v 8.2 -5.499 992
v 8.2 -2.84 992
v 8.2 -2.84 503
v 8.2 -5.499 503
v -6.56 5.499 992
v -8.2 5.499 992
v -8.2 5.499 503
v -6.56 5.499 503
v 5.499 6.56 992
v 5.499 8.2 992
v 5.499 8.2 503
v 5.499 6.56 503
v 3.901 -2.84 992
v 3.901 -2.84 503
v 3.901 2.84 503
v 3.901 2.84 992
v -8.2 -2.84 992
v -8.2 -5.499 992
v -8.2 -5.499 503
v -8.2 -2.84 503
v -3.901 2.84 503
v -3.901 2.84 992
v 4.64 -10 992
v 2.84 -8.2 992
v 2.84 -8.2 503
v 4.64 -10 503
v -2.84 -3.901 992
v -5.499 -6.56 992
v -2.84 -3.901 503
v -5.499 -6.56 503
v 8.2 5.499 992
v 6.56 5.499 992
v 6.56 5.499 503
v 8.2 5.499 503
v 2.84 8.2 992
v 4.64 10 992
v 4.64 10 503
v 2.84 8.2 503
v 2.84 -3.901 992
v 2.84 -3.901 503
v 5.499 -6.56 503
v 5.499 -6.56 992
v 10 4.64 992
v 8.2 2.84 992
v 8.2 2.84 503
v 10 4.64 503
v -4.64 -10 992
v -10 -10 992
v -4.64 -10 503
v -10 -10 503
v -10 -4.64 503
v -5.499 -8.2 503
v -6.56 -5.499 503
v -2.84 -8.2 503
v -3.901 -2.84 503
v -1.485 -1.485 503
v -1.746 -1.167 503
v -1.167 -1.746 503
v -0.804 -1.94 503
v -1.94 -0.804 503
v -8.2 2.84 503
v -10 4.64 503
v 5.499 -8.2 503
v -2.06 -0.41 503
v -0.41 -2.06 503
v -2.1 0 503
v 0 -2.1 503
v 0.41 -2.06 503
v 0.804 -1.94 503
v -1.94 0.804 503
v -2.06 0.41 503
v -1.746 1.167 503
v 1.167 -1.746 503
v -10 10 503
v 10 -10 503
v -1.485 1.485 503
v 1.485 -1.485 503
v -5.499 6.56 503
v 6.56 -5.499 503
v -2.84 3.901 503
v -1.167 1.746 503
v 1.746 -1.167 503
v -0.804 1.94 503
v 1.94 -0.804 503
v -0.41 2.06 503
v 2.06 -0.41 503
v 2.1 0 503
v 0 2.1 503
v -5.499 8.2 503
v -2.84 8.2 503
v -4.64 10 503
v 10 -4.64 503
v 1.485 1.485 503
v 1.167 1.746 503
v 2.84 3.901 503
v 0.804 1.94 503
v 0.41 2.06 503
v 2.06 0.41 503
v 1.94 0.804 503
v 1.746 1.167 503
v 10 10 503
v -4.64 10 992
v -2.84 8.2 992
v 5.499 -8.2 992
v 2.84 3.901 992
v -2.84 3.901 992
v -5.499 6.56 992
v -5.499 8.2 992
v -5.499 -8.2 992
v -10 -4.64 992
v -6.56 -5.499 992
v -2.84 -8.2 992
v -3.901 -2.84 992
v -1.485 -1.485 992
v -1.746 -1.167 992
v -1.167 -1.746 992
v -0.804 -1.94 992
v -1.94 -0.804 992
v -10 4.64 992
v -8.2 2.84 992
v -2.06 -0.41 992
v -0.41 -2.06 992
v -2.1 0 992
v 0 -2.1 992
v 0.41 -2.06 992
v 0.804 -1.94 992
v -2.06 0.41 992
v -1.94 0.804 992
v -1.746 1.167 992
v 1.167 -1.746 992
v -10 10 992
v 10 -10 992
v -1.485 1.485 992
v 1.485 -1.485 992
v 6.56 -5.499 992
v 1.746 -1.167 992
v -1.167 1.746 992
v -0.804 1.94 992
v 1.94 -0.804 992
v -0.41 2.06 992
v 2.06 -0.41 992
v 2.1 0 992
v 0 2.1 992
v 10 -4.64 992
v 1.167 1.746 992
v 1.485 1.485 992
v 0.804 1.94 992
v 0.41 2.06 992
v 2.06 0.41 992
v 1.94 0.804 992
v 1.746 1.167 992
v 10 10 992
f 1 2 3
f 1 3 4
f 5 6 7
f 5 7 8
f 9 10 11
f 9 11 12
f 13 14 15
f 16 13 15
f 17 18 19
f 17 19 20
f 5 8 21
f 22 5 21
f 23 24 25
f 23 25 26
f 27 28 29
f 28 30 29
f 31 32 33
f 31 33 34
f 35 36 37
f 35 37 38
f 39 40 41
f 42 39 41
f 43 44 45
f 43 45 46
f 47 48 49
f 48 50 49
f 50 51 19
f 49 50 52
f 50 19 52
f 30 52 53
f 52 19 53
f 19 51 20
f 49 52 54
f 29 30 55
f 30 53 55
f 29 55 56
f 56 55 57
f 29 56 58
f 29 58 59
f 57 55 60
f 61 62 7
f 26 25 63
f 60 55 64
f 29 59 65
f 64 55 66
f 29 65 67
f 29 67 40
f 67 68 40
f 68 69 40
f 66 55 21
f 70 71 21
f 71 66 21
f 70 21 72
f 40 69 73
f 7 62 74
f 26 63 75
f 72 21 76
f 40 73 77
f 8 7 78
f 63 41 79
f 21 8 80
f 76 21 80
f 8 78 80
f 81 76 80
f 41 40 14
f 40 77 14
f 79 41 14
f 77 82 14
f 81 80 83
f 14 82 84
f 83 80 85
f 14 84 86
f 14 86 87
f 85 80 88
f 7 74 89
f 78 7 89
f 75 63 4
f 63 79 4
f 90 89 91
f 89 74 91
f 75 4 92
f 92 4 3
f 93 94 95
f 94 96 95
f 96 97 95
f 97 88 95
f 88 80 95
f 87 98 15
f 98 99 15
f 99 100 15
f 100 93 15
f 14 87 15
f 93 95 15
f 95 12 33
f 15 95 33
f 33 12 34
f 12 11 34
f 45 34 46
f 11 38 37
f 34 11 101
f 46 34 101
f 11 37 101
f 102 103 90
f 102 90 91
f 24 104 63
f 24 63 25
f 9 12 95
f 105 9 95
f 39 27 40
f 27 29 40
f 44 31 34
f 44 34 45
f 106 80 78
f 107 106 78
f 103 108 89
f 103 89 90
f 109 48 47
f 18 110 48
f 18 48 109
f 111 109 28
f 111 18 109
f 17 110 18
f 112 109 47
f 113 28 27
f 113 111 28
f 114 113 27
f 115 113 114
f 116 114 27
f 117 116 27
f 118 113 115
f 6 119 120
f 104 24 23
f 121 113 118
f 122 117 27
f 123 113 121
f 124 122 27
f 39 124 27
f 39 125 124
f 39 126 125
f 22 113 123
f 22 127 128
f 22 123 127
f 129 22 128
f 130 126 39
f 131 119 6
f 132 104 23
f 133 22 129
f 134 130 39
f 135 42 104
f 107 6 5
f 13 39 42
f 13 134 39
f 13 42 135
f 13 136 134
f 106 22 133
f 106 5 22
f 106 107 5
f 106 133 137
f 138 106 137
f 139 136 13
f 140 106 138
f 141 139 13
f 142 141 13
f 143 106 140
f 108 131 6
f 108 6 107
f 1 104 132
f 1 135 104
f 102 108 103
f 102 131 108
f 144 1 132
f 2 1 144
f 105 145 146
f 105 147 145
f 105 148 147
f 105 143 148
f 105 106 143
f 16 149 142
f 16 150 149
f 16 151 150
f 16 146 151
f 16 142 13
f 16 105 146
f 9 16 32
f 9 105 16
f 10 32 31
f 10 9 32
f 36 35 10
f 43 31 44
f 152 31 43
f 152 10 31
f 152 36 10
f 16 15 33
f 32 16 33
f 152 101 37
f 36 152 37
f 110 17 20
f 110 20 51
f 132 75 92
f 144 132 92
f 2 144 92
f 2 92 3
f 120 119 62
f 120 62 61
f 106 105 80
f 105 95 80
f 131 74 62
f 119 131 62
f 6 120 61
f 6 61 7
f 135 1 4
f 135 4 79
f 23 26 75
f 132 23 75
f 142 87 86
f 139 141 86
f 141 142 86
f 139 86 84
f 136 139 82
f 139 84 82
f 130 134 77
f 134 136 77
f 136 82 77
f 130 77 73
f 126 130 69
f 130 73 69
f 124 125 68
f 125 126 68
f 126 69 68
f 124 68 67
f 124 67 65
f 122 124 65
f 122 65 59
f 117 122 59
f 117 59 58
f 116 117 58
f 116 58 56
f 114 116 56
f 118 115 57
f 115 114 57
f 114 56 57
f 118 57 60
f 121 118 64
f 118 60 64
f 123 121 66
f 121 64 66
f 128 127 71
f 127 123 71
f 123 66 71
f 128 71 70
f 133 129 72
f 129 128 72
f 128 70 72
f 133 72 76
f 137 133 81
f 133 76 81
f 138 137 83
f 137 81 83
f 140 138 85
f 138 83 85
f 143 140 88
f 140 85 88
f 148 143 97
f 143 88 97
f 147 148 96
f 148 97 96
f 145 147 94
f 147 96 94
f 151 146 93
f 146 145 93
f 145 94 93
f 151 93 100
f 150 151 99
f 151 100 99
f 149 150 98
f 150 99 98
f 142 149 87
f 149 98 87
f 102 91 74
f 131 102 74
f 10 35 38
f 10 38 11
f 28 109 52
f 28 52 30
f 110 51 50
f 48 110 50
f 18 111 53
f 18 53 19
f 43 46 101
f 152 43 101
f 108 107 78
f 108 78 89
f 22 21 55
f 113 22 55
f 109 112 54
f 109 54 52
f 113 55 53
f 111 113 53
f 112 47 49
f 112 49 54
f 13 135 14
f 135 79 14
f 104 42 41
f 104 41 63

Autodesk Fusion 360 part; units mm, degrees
sketch "Sketch1" plane through (0, 0, 503) normal (0, 0, 1) x (1, 0, 0)
  line L0 (2.84, -3.9007) -> (5.4993, -6.56)
  line L1 (5.4993, -6.56) -> (5.4993, -8.2)
  line L2 (5.4993, -8.2) -> (2.84, -8.2)
  line L3 (2.84, -8.2) -> (4.64, -10)
  line L4 (4.64, -10) -> (10, -10)
  line L5 (10, -10) -> (10, -4.64)
  line L6 (10, -4.64) -> (8.2, -2.84)
  line L7 (8.2, -2.84) -> (8.2, -5.4993)
  line L8 (8.2, -5.4993) -> (6.56, -5.4993)
  line L9 (6.56, -5.4993) -> (3.9007, -2.84)
  line L10 (3.9007, -2.84) -> (3.9007, 2.84)
  line L11 (3.9007, 2.84) -> (6.56, 5.4993)
  line L12 (6.56, 5.4993) -> (8.2, 5.4993)
  line L13 (8.2, 5.4993) -> (8.2, 2.84)
  line L14 (8.2, 2.84) -> (10, 4.64)
  line L15 (10, 4.64) -> (10, 10)
  line L16 (10, 10) -> (4.64, 10)
  line L17 (4.64, 10) -> (2.84, 8.2)
  line L18 (2.84, 8.2) -> (5.4993, 8.2)
  line L19 (5.4993, 8.2) -> (5.4993, 6.56)
  line L20 (5.4993, 6.56) -> (2.84, 3.9007)
  line L21 (2.84, 3.9007) -> (-2.84, 3.9007)
  line L22 (-2.84, 3.9007) -> (-5.4993, 6.56)
  line L23 (-5.4993, 6.56) -> (-5.4993, 8.2)
  line L24 (-5.4993, 8.2) -> (-2.84, 8.2)
  line L25 (-2.84, 8.2) -> (-4.64, 10)
  line L26 (-4.64, 10) -> (-10, 10)
  line L27 (-10, 10) -> (-10, 4.64)
  line L28 (-10, 4.64) -> (-8.2, 2.84)
  line L29 (-8.2, 2.84) -> (-8.2, 5.4993)
  line L30 (-8.2, 5.4993) -> (-6.56, 5.4993)
  line L31 (-6.56, 5.4993) -> (-3.9007, 2.84)
  line L32 (-3.9007, 2.84) -> (-3.9007, -2.84)
  line L33 (-3.9007, -2.84) -> (-6.56, -5.4993)
  line L34 (-6.56, -5.4993) -> (-8.2, -5.4993)
  line L35 (-8.2, -5.4993) -> (-8.2, -2.84)
  line L36 (-8.2, -2.84) -> (-10, -4.64)
  line L37 (-10, -4.64) -> (-10, -10)
  line L38 (-10, -10) -> (-4.64, -10)
  line L39 (-4.64, -10) -> (-2.84, -8.2)
  line L40 (-2.84, -8.2) -> (-5.4993, -8.2)
  line L41 (-5.4993, -8.2) -> (-5.4993, -6.56)
  line L42 (-5.4993, -6.56) -> (-2.84, -3.9007)
  line L43 (-2.84, -3.9007) -> (2.84, -3.9007)
  circle A0 centre (0, 0) radius 2.1
  circle A1 centre (0, 0) radius 2.1
  line L44 (-2.84, -3.9007) -> (2.84, -3.9007)
  line L45 (-3.9007, 2.84) -> (-3.9007, -2.84)
  line L46 (2.84, 3.9007) -> (-2.84, 3.9007)
  line L47 (3.9007, -2.84) -> (3.9007, 2.84)
  line L48 (5.4993, 6.56) -> (2.84, 3.9007)
  line L49 (5.4993, 8.2) -> (5.4993, 6.56)
  line L50 (2.84, 8.2) -> (5.4993, 8.2)
  line L51 (4.64, 10) -> (2.84, 8.2)
  line L52 (10, 10) -> (4.64, 10)
  line L53 (10, 4.64) -> (10, 10)
  line L54 (8.2, 2.84) -> (10, 4.64)
  line L55 (8.2, 5.4993) -> (8.2, 2.84)
  line L56 (6.56, 5.4993) -> (8.2, 5.4993)
  line L57 (3.9007, 2.84) -> (6.56, 5.4993)
  line L58 (-5.4993, -6.56) -> (-2.84, -3.9007)
  line L59 (-5.4993, -8.2) -> (-5.4993, -6.56)
  line L60 (-2.84, -8.2) -> (-5.4993, -8.2)
  line L61 (-4.64, -10) -> (-2.84, -8.2)
  line L62 (-10, -10) -> (-4.64, -10)
  line L63 (-10, -4.64) -> (-10, -10)
  line L64 (-8.2, -2.84) -> (-10, -4.64)
  line L65 (-8.2, -5.4993) -> (-8.2, -2.84)
  line L66 (-6.56, -5.4993) -> (-8.2, -5.4993)
  line L67 (-3.9007, -2.84) -> (-6.56, -5.4993)
  line L68 (-6.56, 5.4993) -> (-3.9007, 2.84)
  line L69 (-8.2, 5.4993) -> (-6.56, 5.4993)
  line L70 (-8.2, 2.84) -> (-8.2, 5.4993)
  line L71 (-10, 4.64) -> (-8.2, 2.84)
  line L72 (-10, 10) -> (-10, 4.64)
  line L73 (-4.64, 10) -> (-10, 10)
  line L74 (-2.84, 8.2) -> (-4.64, 10)
  line L75 (-5.4993, 8.2) -> (-2.84, 8.2)
  line L76 (-5.4993, 6.56) -> (-5.4993, 8.2)
  line L77 (-2.84, 3.9007) -> (-5.4993, 6.56)
  line L78 (6.56, -5.4993) -> (3.9007, -2.84)
  line L79 (8.2, -5.4993) -> (6.56, -5.4993)
  line L80 (8.2, -2.84) -> (8.2, -5.4993)
  line L81 (10, -4.64) -> (8.2, -2.84)
  line L82 (10, -10) -> (10, -4.64)
  line L83 (4.64, -10) -> (10, -10)
  line L84 (2.84, -8.2) -> (4.64, -10)
  line L85 (5.4993, -8.2) -> (2.84, -8.2)
  line L86 (5.4993, -6.56) -> (5.4993, -8.2)
  line L87 (2.84, -3.9007) -> (5.4993, -6.56)
extrude "Extrude1" add sketch "Sketch1" along normal blind 489 makes body 1
copy_body "Body->Comp1" bodies 1 removing the originals makes body 2 in component "489mm 2020"
component "489mm 2020" placed x (1, 0, 0) y (0, 1, 0) z (0, 0, 1) at (0, 0, 0)
